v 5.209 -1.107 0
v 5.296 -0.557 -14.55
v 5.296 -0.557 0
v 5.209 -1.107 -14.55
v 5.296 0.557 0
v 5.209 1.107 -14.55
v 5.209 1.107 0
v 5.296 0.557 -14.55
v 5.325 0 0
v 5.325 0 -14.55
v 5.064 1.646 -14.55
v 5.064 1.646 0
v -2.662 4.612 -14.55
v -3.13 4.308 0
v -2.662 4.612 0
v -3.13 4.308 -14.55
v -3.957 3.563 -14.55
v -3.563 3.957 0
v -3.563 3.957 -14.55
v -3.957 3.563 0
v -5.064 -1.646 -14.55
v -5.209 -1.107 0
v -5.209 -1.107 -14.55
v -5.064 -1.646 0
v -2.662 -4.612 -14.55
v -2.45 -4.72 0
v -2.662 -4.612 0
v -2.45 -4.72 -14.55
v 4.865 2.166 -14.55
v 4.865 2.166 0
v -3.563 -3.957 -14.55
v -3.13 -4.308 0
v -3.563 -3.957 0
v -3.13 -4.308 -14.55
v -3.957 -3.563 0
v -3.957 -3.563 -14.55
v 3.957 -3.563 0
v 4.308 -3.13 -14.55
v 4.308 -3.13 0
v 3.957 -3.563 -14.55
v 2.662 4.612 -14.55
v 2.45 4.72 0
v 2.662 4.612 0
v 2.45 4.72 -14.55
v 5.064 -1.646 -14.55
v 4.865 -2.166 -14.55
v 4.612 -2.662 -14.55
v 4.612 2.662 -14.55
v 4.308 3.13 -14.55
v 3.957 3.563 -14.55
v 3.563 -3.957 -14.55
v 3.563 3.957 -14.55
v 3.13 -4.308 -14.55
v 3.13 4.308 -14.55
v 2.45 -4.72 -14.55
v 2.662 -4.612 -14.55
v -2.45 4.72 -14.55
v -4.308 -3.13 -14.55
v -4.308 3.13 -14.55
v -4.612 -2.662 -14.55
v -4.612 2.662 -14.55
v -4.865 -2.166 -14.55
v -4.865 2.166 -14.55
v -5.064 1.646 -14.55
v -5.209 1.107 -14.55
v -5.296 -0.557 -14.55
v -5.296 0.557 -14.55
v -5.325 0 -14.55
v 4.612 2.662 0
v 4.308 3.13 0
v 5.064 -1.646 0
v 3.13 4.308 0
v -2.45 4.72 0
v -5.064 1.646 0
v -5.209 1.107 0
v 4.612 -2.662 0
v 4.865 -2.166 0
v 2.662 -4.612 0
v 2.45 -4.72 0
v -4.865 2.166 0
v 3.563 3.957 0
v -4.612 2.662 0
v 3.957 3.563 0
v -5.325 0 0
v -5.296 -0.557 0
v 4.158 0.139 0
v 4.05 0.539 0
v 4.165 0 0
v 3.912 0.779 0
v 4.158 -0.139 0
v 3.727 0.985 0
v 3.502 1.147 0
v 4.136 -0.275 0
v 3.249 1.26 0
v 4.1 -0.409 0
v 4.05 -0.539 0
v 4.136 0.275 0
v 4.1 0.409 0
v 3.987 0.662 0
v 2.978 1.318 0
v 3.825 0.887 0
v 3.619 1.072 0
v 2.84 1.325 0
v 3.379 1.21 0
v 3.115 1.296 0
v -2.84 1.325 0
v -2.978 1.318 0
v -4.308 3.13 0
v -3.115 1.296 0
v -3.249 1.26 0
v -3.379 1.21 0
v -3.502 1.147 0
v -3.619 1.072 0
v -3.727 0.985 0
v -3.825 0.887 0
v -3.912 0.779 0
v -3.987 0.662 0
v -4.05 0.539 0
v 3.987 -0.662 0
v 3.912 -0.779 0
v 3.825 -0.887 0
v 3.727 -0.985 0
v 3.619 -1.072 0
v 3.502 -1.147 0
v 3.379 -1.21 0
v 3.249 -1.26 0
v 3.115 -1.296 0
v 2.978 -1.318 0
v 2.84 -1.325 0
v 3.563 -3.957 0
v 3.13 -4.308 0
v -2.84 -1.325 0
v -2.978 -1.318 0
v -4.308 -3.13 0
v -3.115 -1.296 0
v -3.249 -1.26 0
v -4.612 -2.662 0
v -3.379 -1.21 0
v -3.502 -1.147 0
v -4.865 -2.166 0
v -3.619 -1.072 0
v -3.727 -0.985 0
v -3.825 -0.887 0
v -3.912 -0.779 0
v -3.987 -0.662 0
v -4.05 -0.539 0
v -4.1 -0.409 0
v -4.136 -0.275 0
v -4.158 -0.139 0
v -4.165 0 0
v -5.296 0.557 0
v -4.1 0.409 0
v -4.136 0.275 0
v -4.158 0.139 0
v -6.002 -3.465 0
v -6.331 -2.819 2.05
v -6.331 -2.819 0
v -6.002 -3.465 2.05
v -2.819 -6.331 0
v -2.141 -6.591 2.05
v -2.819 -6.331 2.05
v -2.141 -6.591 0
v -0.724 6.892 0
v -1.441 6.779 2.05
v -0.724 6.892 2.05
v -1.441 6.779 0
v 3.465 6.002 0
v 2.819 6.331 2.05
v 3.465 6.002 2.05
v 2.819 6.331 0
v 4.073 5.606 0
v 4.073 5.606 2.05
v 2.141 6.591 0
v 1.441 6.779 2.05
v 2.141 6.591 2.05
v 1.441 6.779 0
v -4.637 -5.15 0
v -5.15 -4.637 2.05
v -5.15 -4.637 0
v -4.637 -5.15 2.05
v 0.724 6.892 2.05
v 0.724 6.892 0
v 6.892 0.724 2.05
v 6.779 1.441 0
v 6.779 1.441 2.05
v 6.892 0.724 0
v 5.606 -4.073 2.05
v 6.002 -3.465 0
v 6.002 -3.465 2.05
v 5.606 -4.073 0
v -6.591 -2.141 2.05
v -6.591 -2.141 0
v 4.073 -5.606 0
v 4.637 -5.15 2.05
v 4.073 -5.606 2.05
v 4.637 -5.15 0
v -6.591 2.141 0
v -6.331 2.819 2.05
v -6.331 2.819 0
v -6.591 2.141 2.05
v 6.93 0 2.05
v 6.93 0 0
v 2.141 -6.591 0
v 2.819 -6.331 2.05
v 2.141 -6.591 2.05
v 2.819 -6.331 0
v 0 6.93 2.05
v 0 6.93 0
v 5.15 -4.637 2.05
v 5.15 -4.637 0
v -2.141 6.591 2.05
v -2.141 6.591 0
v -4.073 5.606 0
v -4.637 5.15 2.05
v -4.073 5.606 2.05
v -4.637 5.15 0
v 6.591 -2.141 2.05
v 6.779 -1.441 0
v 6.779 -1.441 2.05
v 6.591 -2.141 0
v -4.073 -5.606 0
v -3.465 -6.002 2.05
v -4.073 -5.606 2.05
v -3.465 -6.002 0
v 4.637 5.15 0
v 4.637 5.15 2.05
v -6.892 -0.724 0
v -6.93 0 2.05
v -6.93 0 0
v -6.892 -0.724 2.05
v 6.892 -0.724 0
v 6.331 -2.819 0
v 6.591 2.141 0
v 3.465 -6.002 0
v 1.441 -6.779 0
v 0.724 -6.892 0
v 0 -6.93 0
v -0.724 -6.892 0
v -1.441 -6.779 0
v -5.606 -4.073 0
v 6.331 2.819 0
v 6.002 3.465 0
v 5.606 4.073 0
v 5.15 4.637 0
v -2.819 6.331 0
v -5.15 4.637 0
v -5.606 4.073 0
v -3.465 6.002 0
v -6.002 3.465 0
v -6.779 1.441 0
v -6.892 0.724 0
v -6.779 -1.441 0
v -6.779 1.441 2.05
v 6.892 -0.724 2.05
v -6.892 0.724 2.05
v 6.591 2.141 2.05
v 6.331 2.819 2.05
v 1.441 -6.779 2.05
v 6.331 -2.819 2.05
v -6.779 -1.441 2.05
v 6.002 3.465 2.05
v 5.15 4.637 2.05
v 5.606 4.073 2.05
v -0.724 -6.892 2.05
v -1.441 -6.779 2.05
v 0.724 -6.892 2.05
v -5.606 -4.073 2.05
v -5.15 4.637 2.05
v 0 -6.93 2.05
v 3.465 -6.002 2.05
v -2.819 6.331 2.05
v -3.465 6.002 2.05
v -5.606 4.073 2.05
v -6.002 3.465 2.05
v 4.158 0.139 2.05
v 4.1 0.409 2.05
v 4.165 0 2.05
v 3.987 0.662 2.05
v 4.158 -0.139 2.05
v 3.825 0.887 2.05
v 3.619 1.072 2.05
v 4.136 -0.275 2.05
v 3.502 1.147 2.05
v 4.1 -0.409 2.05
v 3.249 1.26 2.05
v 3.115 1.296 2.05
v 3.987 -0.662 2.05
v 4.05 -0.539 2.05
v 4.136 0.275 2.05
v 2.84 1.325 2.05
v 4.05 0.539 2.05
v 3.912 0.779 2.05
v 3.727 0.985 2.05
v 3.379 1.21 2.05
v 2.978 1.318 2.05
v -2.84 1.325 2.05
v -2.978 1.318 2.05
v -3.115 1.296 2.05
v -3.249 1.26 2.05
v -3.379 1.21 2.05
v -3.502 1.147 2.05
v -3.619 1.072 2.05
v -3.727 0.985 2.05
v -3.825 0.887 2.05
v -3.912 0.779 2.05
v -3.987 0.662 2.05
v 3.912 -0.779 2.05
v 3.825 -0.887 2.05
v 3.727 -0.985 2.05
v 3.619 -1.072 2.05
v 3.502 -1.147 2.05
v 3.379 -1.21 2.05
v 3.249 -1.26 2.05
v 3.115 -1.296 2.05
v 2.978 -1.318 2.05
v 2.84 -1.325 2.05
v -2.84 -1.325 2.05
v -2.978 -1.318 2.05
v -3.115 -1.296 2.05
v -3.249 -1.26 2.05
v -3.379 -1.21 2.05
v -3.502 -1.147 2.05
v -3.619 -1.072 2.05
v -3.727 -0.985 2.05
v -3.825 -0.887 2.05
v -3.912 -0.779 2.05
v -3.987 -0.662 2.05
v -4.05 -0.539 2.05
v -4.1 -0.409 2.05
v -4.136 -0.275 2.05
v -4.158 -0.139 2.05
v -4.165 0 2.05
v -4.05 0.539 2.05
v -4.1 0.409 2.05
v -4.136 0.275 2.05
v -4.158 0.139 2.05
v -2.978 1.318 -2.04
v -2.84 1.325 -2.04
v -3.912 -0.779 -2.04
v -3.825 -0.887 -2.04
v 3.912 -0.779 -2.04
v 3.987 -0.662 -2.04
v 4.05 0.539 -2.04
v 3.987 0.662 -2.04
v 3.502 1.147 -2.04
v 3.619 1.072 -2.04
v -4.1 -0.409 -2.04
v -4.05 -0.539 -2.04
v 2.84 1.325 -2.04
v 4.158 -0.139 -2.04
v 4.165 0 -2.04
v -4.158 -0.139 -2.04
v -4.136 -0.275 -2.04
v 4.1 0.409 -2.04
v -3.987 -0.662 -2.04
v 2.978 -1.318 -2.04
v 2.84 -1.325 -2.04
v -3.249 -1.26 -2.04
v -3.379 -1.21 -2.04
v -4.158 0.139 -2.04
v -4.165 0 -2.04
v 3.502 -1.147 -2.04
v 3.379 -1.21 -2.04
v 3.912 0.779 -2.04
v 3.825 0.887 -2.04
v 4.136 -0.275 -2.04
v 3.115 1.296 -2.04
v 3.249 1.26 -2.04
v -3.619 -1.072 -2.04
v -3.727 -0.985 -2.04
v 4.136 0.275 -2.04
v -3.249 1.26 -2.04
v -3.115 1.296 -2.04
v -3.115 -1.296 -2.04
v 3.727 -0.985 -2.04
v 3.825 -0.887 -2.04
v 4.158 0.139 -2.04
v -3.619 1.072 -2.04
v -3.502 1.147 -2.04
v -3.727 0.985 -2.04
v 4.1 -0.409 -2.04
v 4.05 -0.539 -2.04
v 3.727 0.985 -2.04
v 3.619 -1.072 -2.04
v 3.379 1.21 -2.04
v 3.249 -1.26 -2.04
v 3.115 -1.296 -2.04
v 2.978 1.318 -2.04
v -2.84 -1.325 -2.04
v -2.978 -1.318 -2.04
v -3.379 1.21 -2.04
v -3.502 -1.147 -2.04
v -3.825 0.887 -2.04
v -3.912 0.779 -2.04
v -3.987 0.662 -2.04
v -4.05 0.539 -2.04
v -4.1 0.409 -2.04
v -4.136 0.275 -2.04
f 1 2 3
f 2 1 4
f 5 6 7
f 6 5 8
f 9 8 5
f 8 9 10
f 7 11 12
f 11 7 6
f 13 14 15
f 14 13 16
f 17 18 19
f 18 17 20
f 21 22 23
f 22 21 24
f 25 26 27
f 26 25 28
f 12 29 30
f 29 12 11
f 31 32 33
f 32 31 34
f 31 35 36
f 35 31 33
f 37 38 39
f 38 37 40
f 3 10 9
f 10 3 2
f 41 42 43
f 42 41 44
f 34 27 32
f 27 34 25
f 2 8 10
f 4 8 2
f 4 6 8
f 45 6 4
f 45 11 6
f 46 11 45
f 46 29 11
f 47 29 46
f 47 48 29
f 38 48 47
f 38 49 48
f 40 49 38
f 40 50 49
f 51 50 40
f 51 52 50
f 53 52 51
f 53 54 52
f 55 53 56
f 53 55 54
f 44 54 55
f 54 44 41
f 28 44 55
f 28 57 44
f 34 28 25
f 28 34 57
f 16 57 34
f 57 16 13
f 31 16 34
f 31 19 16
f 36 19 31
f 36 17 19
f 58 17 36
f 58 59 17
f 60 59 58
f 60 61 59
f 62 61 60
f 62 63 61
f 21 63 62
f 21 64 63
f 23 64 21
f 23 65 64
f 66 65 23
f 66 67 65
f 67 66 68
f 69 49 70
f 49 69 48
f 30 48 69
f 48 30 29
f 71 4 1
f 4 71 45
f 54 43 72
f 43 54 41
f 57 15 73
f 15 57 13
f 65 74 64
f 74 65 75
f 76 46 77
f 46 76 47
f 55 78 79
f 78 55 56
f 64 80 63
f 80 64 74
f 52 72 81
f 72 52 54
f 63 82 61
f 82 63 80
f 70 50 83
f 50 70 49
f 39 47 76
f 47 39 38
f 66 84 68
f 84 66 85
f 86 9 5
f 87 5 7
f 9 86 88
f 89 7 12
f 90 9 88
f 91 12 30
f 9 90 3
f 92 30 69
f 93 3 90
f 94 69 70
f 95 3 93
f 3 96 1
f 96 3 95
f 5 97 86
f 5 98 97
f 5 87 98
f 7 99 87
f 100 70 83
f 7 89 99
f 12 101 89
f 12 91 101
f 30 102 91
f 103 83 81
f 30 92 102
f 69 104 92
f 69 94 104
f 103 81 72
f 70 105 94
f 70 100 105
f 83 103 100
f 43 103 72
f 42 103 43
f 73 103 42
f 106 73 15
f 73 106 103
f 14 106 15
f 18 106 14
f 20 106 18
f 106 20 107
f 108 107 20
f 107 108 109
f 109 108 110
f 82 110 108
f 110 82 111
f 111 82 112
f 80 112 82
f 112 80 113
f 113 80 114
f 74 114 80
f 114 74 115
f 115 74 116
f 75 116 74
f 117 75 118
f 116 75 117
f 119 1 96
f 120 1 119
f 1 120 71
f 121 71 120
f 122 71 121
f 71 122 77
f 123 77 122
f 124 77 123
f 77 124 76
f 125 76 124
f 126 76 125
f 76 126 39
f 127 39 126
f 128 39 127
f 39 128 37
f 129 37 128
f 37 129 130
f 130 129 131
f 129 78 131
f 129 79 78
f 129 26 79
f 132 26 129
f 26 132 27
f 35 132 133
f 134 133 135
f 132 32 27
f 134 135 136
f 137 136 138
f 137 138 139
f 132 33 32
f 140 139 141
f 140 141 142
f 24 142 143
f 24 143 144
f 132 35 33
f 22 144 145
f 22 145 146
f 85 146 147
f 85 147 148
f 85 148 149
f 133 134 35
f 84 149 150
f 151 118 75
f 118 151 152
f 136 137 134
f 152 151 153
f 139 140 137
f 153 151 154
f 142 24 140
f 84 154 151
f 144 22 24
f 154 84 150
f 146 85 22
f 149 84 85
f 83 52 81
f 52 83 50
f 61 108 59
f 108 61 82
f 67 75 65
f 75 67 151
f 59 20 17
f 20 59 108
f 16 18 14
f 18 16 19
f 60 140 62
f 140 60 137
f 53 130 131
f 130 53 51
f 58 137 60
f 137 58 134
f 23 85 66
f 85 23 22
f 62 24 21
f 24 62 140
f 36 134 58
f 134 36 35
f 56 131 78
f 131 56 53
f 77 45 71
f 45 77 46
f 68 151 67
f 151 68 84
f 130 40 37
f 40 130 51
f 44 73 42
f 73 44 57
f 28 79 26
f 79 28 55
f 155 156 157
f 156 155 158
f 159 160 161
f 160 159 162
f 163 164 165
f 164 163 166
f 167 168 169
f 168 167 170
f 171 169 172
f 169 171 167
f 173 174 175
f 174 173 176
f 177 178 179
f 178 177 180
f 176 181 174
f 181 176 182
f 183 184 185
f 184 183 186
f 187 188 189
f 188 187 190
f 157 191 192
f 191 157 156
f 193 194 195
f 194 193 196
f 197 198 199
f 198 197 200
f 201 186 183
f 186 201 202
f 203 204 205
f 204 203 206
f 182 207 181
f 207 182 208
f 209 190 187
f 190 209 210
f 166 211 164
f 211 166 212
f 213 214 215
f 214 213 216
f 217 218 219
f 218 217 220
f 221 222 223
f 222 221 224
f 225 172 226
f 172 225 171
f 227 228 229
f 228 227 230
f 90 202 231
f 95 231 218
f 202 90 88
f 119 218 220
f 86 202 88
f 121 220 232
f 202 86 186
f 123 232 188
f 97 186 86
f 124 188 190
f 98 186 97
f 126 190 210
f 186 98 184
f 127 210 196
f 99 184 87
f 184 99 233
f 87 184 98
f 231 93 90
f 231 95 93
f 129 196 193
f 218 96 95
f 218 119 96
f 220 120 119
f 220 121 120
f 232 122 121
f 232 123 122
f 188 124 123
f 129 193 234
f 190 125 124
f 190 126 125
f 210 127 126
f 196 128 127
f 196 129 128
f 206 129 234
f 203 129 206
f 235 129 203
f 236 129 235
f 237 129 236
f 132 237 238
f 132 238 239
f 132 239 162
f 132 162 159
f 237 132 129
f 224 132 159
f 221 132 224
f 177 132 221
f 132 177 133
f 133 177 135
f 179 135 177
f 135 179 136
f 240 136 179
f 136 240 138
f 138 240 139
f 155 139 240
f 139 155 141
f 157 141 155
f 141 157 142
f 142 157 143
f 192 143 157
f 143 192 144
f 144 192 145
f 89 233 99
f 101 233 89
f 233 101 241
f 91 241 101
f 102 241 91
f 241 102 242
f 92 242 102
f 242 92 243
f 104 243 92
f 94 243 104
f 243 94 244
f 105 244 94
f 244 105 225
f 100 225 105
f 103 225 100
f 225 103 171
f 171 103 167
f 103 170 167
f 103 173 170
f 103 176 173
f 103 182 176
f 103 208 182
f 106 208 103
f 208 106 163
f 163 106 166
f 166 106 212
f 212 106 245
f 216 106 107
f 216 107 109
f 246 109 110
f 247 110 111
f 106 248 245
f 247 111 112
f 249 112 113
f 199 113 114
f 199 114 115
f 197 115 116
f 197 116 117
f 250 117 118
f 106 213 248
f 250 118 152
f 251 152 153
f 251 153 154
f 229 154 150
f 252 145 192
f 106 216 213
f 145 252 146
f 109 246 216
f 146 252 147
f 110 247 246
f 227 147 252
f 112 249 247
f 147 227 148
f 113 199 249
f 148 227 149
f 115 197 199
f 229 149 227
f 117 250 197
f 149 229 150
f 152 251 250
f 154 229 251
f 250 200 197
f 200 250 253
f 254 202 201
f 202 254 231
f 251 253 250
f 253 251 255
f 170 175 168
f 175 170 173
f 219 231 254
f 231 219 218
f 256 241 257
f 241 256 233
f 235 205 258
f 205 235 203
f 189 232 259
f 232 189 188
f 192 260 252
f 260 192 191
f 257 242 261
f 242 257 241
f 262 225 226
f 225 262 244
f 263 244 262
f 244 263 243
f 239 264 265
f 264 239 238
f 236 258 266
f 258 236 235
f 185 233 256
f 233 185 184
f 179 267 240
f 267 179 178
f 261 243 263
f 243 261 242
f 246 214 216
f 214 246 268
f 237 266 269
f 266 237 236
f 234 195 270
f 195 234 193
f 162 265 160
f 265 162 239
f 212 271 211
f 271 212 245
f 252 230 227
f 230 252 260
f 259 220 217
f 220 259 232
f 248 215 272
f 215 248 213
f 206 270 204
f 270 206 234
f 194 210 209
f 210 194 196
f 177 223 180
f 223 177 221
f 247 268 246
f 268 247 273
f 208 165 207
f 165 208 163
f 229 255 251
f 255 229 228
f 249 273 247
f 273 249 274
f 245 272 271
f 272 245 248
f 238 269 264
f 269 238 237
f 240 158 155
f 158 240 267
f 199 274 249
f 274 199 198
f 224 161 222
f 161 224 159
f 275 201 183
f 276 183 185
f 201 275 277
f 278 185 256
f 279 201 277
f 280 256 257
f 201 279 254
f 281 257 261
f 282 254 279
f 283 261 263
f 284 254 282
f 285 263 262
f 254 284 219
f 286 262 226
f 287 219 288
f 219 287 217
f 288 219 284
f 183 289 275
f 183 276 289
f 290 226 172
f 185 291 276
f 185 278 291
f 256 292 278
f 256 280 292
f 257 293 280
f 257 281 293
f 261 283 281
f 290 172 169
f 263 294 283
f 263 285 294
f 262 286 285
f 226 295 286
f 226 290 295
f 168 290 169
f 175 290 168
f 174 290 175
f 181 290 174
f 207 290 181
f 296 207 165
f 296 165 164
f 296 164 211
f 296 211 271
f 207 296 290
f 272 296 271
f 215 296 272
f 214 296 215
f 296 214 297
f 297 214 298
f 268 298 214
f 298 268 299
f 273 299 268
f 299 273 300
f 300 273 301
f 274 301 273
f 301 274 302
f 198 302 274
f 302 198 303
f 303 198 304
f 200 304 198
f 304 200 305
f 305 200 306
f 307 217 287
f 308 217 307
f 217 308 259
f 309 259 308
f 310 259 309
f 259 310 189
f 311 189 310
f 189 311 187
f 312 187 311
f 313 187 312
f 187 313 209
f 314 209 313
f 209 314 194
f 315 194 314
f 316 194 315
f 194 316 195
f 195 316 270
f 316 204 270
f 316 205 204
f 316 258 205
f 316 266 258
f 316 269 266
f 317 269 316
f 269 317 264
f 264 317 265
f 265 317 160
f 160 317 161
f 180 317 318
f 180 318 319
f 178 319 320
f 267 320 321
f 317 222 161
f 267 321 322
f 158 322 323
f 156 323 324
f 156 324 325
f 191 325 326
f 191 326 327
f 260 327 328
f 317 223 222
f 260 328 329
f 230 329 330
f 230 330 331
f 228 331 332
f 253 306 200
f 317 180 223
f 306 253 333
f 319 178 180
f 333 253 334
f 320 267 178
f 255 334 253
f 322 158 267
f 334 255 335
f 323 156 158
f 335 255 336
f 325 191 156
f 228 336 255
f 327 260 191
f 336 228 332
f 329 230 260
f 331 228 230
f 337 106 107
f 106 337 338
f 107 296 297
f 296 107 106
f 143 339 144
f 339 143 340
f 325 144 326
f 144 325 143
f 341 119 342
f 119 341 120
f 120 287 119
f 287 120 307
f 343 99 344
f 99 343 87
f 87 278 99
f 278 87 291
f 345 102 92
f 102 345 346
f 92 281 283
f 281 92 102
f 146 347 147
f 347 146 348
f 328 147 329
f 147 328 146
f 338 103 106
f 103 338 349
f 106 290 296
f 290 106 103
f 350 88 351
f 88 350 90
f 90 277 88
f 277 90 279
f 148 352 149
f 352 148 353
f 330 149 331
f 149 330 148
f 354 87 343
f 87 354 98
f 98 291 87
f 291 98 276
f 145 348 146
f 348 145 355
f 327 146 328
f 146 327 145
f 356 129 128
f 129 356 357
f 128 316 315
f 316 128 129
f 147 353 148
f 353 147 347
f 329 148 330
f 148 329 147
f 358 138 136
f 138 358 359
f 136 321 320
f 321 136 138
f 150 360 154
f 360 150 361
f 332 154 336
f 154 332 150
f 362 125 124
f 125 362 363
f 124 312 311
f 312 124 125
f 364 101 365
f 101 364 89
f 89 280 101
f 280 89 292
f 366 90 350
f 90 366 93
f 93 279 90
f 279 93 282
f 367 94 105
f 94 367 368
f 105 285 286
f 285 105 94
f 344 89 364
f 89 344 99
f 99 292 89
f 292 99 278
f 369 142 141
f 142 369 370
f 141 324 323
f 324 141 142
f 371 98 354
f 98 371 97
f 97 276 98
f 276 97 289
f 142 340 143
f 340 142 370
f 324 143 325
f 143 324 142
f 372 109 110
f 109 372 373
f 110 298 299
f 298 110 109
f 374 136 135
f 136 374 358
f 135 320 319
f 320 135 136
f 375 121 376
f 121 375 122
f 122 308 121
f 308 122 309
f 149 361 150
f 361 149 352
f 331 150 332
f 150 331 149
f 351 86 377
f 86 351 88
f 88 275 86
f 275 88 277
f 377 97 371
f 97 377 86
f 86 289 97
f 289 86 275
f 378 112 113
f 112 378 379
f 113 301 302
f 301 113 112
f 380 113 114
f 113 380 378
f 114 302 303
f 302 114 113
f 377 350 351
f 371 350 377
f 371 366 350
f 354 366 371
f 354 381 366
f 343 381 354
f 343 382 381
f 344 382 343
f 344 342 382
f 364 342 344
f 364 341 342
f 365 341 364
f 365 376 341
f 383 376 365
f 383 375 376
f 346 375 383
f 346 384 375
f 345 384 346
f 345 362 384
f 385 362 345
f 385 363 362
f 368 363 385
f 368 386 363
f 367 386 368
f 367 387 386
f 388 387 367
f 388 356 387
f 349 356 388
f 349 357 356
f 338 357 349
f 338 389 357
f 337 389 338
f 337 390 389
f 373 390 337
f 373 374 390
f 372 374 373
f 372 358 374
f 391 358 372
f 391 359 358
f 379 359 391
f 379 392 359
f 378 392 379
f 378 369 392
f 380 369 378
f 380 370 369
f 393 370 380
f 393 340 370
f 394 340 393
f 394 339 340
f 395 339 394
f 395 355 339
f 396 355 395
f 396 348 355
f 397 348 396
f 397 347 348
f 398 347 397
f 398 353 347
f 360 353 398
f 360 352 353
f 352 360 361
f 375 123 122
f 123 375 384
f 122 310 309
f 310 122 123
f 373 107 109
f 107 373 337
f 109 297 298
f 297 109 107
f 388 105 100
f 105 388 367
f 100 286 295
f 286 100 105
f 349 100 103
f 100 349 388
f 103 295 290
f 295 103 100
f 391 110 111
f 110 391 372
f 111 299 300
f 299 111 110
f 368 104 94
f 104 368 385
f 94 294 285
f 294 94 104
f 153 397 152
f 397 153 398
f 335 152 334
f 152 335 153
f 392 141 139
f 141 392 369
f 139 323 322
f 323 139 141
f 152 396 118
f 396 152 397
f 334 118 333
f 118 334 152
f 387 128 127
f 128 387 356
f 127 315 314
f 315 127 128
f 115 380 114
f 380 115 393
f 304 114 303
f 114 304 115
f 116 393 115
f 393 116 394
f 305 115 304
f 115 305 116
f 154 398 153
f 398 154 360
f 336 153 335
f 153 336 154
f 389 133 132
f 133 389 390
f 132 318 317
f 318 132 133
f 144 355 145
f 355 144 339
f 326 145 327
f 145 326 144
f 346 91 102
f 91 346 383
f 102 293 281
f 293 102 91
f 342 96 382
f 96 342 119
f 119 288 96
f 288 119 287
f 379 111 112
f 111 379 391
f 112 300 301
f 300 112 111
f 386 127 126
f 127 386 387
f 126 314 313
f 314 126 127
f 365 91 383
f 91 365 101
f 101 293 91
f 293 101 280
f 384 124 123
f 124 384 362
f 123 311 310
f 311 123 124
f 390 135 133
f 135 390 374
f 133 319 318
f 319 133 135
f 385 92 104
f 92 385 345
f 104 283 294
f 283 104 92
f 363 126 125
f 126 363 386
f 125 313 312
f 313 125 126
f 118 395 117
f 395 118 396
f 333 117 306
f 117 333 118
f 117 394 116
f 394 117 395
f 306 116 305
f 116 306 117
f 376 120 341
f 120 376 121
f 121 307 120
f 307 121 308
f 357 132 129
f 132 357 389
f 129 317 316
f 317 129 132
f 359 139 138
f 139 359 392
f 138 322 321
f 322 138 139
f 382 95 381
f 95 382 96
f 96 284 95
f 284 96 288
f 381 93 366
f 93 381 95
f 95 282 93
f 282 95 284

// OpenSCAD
// file: configurations.scad
usbConnector_total_z_size = 16.6;
usbConnector_head_z_size = 2.05;
usbConnector_head_diameter = 13.86;
usbConnector_bottom_part_diameter = 10.65;
usbConnector_bottom_part_flat_size = 9.44;
// main file
include <configurations.scad>


module usbConnector(
    total_z_size = usbConnector_total_z_size,
    head_z_size = usbConnector_head_z_size,
    head_diameter = usbConnector_head_diameter,
    bottom_part_diameter = usbConnector_bottom_part_diameter,
    bottom_part_flat_size = usbConnector_bottom_part_flat_size
) {

    epsilon = 0.01;
    
    // Head
    color("Grey")
        difference() {

            union() {
                cylinder(d = head_diameter, h = head_z_size, $fn = 60);

                // Bottom part
                bottom_part_z_size = total_z_size - head_z_size;
                translate([0, 0, -bottom_part_z_size])
                    intersection() {
                        cylinder(d = bottom_part_diameter, h = bottom_part_z_size, $fn = 60);
                        
                        translate([-bottom_part_diameter / 2, -bottom_part_flat_size / 2, 0])
                            cube([bottom_part_diameter, bottom_part_flat_size, bottom_part_z_size]);
                    }
            }

            x_size_total = 8.33;
            u_diam = 2.65;

            hull() {
                translate([-x_size_total / 2 + u_diam / 2, 0, -head_z_size + epsilon])
                    cylinder(d = u_diam, h = head_z_size * 2, $fn = 60);

                translate([x_size_total / 2 - u_diam / 2, 0, -head_z_size + epsilon])
                    cylinder(d = u_diam, h = head_z_size * 2, $fn = 60);

            }
        
        }



}

usbConnector();
